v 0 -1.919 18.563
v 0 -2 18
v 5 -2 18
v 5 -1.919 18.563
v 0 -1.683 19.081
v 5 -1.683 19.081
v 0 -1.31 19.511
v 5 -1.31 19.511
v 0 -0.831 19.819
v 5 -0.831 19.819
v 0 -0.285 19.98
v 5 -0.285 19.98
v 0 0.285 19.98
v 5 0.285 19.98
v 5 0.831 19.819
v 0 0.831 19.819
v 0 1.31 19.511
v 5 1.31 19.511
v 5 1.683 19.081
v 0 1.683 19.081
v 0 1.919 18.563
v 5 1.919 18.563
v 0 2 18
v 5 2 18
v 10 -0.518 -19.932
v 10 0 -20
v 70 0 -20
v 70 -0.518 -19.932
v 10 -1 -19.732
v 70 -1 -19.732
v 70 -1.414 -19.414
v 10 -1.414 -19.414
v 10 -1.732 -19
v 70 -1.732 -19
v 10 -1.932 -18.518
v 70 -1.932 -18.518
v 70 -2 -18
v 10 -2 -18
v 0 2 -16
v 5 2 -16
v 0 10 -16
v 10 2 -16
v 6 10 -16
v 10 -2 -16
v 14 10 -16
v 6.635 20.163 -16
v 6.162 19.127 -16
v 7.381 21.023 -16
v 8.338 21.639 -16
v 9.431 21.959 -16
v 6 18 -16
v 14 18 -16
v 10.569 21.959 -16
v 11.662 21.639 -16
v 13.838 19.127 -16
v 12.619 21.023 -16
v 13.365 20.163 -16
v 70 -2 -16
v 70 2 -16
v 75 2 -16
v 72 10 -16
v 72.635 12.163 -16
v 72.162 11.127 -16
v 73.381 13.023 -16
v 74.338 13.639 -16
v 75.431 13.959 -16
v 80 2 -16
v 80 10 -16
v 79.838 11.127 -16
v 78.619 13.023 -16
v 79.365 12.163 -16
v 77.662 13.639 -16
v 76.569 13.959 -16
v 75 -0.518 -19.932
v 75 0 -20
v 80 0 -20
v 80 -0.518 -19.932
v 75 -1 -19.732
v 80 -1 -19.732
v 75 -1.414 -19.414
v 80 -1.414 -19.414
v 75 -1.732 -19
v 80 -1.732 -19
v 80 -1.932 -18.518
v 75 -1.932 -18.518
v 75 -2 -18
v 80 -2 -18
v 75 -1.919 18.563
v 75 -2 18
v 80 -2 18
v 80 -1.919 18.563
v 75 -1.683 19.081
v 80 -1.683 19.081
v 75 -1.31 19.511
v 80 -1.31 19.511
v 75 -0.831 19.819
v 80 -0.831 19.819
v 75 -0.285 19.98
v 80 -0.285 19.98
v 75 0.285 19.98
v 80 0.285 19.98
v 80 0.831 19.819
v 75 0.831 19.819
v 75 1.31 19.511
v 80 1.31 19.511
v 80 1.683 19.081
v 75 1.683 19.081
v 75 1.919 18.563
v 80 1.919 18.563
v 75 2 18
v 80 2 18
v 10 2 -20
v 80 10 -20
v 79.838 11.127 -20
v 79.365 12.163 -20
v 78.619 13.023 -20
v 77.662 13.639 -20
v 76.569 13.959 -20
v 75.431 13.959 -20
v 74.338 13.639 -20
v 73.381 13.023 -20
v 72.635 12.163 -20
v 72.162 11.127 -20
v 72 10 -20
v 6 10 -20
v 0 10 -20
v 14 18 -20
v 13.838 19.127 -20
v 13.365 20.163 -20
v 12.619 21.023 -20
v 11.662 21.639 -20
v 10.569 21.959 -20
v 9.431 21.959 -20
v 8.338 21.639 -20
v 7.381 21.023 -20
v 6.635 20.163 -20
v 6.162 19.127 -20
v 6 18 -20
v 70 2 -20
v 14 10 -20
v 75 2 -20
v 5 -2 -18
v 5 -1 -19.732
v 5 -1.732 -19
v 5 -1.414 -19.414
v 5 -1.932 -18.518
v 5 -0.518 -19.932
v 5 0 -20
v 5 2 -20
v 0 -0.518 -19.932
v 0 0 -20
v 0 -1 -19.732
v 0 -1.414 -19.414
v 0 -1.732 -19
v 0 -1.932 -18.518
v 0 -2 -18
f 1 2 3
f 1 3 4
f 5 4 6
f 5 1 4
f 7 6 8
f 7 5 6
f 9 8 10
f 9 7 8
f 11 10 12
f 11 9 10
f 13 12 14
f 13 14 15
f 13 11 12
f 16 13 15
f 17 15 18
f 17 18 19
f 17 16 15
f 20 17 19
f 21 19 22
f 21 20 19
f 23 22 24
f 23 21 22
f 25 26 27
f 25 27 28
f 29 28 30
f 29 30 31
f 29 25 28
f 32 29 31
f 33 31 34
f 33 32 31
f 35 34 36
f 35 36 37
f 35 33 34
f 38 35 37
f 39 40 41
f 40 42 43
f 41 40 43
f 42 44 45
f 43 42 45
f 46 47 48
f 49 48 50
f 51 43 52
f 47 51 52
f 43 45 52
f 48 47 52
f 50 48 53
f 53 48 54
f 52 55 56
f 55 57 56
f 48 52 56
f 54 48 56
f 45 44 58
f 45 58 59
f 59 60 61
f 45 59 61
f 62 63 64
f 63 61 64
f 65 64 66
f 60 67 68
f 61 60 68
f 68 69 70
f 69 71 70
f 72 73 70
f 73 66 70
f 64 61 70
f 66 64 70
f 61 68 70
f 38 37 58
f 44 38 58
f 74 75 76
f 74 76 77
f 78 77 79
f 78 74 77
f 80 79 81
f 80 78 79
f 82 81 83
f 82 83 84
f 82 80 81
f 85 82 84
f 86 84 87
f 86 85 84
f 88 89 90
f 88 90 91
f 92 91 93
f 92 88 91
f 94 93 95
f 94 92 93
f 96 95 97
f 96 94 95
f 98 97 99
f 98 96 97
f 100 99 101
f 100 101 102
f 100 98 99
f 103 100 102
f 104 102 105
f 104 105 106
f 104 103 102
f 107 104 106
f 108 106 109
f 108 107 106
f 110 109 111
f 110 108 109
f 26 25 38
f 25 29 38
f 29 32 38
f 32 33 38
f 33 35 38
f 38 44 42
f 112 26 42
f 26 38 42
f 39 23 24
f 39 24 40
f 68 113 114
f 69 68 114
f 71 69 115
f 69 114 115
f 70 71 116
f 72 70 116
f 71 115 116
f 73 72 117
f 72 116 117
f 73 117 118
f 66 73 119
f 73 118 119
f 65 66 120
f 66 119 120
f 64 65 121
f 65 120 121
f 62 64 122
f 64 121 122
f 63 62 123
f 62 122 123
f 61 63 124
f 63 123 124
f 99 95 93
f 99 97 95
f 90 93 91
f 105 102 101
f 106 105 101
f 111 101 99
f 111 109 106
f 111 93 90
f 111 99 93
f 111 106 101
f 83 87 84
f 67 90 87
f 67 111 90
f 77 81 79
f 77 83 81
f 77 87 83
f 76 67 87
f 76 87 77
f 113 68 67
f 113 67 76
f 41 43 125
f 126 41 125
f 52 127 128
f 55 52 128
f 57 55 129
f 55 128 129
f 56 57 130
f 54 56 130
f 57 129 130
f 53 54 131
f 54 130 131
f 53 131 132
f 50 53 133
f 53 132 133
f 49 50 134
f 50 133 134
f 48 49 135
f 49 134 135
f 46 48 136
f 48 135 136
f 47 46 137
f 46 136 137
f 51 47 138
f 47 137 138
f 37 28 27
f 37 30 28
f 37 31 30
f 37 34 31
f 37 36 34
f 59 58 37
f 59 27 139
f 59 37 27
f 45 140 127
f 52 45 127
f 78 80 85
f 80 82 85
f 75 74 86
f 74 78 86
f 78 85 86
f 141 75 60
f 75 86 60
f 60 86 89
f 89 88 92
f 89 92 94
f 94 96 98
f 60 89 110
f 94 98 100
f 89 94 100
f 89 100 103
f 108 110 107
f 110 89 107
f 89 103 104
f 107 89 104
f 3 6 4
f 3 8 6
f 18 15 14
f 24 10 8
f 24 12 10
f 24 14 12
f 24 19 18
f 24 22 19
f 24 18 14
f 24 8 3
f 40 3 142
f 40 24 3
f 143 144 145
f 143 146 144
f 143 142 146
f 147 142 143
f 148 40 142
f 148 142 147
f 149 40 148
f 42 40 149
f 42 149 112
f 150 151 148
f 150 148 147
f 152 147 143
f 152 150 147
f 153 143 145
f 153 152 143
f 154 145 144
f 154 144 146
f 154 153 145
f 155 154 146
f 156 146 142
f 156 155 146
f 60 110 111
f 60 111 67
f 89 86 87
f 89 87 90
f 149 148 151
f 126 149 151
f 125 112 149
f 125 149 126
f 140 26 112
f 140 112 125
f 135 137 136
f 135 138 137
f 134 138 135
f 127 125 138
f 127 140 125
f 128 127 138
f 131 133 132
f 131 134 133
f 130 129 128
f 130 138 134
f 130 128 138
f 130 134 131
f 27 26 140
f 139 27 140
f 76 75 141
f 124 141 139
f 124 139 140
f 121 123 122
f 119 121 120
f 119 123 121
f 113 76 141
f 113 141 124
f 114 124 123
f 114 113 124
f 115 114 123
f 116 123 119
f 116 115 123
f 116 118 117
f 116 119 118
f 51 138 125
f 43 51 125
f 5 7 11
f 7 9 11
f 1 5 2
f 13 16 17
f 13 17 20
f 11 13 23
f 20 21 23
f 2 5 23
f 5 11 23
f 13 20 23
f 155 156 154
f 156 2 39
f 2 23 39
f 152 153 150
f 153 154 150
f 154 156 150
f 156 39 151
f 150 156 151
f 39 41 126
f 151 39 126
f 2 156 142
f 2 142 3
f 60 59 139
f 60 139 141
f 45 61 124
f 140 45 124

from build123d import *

# Parameters (mm, degrees)
EXTRUDE_1_DEPTH     = 80
SKETCH_10_W         = 4
SKETCH_10_H         = 8
EXTRUDE_8_DEPTH     = 80
EXTRUDE_9_DEPTH     = 4
SKETCH_12_W         = 70
SKETCH_12_H         = 40.815900945
CUT_EXTRUDE_1_DEPTH = 10
SKETCH_13_W         = 5
SKETCH_13_H         = 4
CUT_EXTRUDE_2_DEPTH = 10


with BuildPart() as part:
    # 草图1 → 凸台-拉伸1 (new body)
    with BuildSketch(Plane(origin=(0, 0, 0), x_dir=(0, 0, -1), z_dir=(1, 0, 0))):
        with BuildLine():
            Line((-18, 2), (18, 2))
            Line((18, 2), (20, 2))
            Line((20, 2), (20, 0))
            ThreePointArc((20, 0), (19.414213562, -1.414213562), (18, -2))
            Line((18, -2), (-18, -2))
            ThreePointArc((-18, -2), (-20, 0), (-18, 2))
        make_face()
    extrude(amount=EXTRUDE_1_DEPTH)

    # 草图10 → 凸台-拉伸8 (add)
    with BuildSketch(Plane(origin=(80, 0, 0), x_dir=(0, 0, -1), z_dir=(1, 0, 0))):
        with Locations((18, 6)):
            Rectangle(SKETCH_10_W, SKETCH_10_H)
    extrude(amount=-EXTRUDE_8_DEPTH)

    # 草图11 → 凸台-拉伸9 (add)
    with BuildSketch(Plane(origin=(0, 0, -20), x_dir=(-1, 0, 0), z_dir=(0, 0, -1))):
        with BuildLine():
            Line((-6, 10), (-14, 10))
            Line((-14, 10), (-14, 18))
            ThreePointArc((-14, 18), (-10, 22), (-6, 18))
            Line((-6, 18), (-6, 10))
        make_face()
        with BuildLine():
            Line((-72, 6), (-80, 6))
            Line((-80, 6), (-80, 10))
            ThreePointArc((-80, 10), (-76, 14), (-72, 10))
            Line((-72, 10), (-72, 6))
        make_face()
    extrude(amount=-EXTRUDE_9_DEPTH)

    # 草图12 → 切除-拉伸1 (cut)
    with BuildSketch(Plane(origin=(0, 2, 0), x_dir=(1, 0, 0), z_dir=(0, 1, 0))):
        with Locations((40, -4.407950473)):
            Rectangle(SKETCH_12_W, SKETCH_12_H)
    extrude(amount=-CUT_EXTRUDE_1_DEPTH, mode=Mode.SUBTRACT)

    # 草图13 → 切除-拉伸2 (cut)
    with BuildSketch(Plane.XY.offset(-16)):
        with Locations((7.5, 0)):
            Rectangle(SKETCH_13_W, SKETCH_13_H)
        with Locations((72.5, 0)):
            Rectangle(SKETCH_13_W, SKETCH_13_H)
    extrude(amount=-CUT_EXTRUDE_2_DEPTH, mode=Mode.SUBTRACT)


solid = part.part
